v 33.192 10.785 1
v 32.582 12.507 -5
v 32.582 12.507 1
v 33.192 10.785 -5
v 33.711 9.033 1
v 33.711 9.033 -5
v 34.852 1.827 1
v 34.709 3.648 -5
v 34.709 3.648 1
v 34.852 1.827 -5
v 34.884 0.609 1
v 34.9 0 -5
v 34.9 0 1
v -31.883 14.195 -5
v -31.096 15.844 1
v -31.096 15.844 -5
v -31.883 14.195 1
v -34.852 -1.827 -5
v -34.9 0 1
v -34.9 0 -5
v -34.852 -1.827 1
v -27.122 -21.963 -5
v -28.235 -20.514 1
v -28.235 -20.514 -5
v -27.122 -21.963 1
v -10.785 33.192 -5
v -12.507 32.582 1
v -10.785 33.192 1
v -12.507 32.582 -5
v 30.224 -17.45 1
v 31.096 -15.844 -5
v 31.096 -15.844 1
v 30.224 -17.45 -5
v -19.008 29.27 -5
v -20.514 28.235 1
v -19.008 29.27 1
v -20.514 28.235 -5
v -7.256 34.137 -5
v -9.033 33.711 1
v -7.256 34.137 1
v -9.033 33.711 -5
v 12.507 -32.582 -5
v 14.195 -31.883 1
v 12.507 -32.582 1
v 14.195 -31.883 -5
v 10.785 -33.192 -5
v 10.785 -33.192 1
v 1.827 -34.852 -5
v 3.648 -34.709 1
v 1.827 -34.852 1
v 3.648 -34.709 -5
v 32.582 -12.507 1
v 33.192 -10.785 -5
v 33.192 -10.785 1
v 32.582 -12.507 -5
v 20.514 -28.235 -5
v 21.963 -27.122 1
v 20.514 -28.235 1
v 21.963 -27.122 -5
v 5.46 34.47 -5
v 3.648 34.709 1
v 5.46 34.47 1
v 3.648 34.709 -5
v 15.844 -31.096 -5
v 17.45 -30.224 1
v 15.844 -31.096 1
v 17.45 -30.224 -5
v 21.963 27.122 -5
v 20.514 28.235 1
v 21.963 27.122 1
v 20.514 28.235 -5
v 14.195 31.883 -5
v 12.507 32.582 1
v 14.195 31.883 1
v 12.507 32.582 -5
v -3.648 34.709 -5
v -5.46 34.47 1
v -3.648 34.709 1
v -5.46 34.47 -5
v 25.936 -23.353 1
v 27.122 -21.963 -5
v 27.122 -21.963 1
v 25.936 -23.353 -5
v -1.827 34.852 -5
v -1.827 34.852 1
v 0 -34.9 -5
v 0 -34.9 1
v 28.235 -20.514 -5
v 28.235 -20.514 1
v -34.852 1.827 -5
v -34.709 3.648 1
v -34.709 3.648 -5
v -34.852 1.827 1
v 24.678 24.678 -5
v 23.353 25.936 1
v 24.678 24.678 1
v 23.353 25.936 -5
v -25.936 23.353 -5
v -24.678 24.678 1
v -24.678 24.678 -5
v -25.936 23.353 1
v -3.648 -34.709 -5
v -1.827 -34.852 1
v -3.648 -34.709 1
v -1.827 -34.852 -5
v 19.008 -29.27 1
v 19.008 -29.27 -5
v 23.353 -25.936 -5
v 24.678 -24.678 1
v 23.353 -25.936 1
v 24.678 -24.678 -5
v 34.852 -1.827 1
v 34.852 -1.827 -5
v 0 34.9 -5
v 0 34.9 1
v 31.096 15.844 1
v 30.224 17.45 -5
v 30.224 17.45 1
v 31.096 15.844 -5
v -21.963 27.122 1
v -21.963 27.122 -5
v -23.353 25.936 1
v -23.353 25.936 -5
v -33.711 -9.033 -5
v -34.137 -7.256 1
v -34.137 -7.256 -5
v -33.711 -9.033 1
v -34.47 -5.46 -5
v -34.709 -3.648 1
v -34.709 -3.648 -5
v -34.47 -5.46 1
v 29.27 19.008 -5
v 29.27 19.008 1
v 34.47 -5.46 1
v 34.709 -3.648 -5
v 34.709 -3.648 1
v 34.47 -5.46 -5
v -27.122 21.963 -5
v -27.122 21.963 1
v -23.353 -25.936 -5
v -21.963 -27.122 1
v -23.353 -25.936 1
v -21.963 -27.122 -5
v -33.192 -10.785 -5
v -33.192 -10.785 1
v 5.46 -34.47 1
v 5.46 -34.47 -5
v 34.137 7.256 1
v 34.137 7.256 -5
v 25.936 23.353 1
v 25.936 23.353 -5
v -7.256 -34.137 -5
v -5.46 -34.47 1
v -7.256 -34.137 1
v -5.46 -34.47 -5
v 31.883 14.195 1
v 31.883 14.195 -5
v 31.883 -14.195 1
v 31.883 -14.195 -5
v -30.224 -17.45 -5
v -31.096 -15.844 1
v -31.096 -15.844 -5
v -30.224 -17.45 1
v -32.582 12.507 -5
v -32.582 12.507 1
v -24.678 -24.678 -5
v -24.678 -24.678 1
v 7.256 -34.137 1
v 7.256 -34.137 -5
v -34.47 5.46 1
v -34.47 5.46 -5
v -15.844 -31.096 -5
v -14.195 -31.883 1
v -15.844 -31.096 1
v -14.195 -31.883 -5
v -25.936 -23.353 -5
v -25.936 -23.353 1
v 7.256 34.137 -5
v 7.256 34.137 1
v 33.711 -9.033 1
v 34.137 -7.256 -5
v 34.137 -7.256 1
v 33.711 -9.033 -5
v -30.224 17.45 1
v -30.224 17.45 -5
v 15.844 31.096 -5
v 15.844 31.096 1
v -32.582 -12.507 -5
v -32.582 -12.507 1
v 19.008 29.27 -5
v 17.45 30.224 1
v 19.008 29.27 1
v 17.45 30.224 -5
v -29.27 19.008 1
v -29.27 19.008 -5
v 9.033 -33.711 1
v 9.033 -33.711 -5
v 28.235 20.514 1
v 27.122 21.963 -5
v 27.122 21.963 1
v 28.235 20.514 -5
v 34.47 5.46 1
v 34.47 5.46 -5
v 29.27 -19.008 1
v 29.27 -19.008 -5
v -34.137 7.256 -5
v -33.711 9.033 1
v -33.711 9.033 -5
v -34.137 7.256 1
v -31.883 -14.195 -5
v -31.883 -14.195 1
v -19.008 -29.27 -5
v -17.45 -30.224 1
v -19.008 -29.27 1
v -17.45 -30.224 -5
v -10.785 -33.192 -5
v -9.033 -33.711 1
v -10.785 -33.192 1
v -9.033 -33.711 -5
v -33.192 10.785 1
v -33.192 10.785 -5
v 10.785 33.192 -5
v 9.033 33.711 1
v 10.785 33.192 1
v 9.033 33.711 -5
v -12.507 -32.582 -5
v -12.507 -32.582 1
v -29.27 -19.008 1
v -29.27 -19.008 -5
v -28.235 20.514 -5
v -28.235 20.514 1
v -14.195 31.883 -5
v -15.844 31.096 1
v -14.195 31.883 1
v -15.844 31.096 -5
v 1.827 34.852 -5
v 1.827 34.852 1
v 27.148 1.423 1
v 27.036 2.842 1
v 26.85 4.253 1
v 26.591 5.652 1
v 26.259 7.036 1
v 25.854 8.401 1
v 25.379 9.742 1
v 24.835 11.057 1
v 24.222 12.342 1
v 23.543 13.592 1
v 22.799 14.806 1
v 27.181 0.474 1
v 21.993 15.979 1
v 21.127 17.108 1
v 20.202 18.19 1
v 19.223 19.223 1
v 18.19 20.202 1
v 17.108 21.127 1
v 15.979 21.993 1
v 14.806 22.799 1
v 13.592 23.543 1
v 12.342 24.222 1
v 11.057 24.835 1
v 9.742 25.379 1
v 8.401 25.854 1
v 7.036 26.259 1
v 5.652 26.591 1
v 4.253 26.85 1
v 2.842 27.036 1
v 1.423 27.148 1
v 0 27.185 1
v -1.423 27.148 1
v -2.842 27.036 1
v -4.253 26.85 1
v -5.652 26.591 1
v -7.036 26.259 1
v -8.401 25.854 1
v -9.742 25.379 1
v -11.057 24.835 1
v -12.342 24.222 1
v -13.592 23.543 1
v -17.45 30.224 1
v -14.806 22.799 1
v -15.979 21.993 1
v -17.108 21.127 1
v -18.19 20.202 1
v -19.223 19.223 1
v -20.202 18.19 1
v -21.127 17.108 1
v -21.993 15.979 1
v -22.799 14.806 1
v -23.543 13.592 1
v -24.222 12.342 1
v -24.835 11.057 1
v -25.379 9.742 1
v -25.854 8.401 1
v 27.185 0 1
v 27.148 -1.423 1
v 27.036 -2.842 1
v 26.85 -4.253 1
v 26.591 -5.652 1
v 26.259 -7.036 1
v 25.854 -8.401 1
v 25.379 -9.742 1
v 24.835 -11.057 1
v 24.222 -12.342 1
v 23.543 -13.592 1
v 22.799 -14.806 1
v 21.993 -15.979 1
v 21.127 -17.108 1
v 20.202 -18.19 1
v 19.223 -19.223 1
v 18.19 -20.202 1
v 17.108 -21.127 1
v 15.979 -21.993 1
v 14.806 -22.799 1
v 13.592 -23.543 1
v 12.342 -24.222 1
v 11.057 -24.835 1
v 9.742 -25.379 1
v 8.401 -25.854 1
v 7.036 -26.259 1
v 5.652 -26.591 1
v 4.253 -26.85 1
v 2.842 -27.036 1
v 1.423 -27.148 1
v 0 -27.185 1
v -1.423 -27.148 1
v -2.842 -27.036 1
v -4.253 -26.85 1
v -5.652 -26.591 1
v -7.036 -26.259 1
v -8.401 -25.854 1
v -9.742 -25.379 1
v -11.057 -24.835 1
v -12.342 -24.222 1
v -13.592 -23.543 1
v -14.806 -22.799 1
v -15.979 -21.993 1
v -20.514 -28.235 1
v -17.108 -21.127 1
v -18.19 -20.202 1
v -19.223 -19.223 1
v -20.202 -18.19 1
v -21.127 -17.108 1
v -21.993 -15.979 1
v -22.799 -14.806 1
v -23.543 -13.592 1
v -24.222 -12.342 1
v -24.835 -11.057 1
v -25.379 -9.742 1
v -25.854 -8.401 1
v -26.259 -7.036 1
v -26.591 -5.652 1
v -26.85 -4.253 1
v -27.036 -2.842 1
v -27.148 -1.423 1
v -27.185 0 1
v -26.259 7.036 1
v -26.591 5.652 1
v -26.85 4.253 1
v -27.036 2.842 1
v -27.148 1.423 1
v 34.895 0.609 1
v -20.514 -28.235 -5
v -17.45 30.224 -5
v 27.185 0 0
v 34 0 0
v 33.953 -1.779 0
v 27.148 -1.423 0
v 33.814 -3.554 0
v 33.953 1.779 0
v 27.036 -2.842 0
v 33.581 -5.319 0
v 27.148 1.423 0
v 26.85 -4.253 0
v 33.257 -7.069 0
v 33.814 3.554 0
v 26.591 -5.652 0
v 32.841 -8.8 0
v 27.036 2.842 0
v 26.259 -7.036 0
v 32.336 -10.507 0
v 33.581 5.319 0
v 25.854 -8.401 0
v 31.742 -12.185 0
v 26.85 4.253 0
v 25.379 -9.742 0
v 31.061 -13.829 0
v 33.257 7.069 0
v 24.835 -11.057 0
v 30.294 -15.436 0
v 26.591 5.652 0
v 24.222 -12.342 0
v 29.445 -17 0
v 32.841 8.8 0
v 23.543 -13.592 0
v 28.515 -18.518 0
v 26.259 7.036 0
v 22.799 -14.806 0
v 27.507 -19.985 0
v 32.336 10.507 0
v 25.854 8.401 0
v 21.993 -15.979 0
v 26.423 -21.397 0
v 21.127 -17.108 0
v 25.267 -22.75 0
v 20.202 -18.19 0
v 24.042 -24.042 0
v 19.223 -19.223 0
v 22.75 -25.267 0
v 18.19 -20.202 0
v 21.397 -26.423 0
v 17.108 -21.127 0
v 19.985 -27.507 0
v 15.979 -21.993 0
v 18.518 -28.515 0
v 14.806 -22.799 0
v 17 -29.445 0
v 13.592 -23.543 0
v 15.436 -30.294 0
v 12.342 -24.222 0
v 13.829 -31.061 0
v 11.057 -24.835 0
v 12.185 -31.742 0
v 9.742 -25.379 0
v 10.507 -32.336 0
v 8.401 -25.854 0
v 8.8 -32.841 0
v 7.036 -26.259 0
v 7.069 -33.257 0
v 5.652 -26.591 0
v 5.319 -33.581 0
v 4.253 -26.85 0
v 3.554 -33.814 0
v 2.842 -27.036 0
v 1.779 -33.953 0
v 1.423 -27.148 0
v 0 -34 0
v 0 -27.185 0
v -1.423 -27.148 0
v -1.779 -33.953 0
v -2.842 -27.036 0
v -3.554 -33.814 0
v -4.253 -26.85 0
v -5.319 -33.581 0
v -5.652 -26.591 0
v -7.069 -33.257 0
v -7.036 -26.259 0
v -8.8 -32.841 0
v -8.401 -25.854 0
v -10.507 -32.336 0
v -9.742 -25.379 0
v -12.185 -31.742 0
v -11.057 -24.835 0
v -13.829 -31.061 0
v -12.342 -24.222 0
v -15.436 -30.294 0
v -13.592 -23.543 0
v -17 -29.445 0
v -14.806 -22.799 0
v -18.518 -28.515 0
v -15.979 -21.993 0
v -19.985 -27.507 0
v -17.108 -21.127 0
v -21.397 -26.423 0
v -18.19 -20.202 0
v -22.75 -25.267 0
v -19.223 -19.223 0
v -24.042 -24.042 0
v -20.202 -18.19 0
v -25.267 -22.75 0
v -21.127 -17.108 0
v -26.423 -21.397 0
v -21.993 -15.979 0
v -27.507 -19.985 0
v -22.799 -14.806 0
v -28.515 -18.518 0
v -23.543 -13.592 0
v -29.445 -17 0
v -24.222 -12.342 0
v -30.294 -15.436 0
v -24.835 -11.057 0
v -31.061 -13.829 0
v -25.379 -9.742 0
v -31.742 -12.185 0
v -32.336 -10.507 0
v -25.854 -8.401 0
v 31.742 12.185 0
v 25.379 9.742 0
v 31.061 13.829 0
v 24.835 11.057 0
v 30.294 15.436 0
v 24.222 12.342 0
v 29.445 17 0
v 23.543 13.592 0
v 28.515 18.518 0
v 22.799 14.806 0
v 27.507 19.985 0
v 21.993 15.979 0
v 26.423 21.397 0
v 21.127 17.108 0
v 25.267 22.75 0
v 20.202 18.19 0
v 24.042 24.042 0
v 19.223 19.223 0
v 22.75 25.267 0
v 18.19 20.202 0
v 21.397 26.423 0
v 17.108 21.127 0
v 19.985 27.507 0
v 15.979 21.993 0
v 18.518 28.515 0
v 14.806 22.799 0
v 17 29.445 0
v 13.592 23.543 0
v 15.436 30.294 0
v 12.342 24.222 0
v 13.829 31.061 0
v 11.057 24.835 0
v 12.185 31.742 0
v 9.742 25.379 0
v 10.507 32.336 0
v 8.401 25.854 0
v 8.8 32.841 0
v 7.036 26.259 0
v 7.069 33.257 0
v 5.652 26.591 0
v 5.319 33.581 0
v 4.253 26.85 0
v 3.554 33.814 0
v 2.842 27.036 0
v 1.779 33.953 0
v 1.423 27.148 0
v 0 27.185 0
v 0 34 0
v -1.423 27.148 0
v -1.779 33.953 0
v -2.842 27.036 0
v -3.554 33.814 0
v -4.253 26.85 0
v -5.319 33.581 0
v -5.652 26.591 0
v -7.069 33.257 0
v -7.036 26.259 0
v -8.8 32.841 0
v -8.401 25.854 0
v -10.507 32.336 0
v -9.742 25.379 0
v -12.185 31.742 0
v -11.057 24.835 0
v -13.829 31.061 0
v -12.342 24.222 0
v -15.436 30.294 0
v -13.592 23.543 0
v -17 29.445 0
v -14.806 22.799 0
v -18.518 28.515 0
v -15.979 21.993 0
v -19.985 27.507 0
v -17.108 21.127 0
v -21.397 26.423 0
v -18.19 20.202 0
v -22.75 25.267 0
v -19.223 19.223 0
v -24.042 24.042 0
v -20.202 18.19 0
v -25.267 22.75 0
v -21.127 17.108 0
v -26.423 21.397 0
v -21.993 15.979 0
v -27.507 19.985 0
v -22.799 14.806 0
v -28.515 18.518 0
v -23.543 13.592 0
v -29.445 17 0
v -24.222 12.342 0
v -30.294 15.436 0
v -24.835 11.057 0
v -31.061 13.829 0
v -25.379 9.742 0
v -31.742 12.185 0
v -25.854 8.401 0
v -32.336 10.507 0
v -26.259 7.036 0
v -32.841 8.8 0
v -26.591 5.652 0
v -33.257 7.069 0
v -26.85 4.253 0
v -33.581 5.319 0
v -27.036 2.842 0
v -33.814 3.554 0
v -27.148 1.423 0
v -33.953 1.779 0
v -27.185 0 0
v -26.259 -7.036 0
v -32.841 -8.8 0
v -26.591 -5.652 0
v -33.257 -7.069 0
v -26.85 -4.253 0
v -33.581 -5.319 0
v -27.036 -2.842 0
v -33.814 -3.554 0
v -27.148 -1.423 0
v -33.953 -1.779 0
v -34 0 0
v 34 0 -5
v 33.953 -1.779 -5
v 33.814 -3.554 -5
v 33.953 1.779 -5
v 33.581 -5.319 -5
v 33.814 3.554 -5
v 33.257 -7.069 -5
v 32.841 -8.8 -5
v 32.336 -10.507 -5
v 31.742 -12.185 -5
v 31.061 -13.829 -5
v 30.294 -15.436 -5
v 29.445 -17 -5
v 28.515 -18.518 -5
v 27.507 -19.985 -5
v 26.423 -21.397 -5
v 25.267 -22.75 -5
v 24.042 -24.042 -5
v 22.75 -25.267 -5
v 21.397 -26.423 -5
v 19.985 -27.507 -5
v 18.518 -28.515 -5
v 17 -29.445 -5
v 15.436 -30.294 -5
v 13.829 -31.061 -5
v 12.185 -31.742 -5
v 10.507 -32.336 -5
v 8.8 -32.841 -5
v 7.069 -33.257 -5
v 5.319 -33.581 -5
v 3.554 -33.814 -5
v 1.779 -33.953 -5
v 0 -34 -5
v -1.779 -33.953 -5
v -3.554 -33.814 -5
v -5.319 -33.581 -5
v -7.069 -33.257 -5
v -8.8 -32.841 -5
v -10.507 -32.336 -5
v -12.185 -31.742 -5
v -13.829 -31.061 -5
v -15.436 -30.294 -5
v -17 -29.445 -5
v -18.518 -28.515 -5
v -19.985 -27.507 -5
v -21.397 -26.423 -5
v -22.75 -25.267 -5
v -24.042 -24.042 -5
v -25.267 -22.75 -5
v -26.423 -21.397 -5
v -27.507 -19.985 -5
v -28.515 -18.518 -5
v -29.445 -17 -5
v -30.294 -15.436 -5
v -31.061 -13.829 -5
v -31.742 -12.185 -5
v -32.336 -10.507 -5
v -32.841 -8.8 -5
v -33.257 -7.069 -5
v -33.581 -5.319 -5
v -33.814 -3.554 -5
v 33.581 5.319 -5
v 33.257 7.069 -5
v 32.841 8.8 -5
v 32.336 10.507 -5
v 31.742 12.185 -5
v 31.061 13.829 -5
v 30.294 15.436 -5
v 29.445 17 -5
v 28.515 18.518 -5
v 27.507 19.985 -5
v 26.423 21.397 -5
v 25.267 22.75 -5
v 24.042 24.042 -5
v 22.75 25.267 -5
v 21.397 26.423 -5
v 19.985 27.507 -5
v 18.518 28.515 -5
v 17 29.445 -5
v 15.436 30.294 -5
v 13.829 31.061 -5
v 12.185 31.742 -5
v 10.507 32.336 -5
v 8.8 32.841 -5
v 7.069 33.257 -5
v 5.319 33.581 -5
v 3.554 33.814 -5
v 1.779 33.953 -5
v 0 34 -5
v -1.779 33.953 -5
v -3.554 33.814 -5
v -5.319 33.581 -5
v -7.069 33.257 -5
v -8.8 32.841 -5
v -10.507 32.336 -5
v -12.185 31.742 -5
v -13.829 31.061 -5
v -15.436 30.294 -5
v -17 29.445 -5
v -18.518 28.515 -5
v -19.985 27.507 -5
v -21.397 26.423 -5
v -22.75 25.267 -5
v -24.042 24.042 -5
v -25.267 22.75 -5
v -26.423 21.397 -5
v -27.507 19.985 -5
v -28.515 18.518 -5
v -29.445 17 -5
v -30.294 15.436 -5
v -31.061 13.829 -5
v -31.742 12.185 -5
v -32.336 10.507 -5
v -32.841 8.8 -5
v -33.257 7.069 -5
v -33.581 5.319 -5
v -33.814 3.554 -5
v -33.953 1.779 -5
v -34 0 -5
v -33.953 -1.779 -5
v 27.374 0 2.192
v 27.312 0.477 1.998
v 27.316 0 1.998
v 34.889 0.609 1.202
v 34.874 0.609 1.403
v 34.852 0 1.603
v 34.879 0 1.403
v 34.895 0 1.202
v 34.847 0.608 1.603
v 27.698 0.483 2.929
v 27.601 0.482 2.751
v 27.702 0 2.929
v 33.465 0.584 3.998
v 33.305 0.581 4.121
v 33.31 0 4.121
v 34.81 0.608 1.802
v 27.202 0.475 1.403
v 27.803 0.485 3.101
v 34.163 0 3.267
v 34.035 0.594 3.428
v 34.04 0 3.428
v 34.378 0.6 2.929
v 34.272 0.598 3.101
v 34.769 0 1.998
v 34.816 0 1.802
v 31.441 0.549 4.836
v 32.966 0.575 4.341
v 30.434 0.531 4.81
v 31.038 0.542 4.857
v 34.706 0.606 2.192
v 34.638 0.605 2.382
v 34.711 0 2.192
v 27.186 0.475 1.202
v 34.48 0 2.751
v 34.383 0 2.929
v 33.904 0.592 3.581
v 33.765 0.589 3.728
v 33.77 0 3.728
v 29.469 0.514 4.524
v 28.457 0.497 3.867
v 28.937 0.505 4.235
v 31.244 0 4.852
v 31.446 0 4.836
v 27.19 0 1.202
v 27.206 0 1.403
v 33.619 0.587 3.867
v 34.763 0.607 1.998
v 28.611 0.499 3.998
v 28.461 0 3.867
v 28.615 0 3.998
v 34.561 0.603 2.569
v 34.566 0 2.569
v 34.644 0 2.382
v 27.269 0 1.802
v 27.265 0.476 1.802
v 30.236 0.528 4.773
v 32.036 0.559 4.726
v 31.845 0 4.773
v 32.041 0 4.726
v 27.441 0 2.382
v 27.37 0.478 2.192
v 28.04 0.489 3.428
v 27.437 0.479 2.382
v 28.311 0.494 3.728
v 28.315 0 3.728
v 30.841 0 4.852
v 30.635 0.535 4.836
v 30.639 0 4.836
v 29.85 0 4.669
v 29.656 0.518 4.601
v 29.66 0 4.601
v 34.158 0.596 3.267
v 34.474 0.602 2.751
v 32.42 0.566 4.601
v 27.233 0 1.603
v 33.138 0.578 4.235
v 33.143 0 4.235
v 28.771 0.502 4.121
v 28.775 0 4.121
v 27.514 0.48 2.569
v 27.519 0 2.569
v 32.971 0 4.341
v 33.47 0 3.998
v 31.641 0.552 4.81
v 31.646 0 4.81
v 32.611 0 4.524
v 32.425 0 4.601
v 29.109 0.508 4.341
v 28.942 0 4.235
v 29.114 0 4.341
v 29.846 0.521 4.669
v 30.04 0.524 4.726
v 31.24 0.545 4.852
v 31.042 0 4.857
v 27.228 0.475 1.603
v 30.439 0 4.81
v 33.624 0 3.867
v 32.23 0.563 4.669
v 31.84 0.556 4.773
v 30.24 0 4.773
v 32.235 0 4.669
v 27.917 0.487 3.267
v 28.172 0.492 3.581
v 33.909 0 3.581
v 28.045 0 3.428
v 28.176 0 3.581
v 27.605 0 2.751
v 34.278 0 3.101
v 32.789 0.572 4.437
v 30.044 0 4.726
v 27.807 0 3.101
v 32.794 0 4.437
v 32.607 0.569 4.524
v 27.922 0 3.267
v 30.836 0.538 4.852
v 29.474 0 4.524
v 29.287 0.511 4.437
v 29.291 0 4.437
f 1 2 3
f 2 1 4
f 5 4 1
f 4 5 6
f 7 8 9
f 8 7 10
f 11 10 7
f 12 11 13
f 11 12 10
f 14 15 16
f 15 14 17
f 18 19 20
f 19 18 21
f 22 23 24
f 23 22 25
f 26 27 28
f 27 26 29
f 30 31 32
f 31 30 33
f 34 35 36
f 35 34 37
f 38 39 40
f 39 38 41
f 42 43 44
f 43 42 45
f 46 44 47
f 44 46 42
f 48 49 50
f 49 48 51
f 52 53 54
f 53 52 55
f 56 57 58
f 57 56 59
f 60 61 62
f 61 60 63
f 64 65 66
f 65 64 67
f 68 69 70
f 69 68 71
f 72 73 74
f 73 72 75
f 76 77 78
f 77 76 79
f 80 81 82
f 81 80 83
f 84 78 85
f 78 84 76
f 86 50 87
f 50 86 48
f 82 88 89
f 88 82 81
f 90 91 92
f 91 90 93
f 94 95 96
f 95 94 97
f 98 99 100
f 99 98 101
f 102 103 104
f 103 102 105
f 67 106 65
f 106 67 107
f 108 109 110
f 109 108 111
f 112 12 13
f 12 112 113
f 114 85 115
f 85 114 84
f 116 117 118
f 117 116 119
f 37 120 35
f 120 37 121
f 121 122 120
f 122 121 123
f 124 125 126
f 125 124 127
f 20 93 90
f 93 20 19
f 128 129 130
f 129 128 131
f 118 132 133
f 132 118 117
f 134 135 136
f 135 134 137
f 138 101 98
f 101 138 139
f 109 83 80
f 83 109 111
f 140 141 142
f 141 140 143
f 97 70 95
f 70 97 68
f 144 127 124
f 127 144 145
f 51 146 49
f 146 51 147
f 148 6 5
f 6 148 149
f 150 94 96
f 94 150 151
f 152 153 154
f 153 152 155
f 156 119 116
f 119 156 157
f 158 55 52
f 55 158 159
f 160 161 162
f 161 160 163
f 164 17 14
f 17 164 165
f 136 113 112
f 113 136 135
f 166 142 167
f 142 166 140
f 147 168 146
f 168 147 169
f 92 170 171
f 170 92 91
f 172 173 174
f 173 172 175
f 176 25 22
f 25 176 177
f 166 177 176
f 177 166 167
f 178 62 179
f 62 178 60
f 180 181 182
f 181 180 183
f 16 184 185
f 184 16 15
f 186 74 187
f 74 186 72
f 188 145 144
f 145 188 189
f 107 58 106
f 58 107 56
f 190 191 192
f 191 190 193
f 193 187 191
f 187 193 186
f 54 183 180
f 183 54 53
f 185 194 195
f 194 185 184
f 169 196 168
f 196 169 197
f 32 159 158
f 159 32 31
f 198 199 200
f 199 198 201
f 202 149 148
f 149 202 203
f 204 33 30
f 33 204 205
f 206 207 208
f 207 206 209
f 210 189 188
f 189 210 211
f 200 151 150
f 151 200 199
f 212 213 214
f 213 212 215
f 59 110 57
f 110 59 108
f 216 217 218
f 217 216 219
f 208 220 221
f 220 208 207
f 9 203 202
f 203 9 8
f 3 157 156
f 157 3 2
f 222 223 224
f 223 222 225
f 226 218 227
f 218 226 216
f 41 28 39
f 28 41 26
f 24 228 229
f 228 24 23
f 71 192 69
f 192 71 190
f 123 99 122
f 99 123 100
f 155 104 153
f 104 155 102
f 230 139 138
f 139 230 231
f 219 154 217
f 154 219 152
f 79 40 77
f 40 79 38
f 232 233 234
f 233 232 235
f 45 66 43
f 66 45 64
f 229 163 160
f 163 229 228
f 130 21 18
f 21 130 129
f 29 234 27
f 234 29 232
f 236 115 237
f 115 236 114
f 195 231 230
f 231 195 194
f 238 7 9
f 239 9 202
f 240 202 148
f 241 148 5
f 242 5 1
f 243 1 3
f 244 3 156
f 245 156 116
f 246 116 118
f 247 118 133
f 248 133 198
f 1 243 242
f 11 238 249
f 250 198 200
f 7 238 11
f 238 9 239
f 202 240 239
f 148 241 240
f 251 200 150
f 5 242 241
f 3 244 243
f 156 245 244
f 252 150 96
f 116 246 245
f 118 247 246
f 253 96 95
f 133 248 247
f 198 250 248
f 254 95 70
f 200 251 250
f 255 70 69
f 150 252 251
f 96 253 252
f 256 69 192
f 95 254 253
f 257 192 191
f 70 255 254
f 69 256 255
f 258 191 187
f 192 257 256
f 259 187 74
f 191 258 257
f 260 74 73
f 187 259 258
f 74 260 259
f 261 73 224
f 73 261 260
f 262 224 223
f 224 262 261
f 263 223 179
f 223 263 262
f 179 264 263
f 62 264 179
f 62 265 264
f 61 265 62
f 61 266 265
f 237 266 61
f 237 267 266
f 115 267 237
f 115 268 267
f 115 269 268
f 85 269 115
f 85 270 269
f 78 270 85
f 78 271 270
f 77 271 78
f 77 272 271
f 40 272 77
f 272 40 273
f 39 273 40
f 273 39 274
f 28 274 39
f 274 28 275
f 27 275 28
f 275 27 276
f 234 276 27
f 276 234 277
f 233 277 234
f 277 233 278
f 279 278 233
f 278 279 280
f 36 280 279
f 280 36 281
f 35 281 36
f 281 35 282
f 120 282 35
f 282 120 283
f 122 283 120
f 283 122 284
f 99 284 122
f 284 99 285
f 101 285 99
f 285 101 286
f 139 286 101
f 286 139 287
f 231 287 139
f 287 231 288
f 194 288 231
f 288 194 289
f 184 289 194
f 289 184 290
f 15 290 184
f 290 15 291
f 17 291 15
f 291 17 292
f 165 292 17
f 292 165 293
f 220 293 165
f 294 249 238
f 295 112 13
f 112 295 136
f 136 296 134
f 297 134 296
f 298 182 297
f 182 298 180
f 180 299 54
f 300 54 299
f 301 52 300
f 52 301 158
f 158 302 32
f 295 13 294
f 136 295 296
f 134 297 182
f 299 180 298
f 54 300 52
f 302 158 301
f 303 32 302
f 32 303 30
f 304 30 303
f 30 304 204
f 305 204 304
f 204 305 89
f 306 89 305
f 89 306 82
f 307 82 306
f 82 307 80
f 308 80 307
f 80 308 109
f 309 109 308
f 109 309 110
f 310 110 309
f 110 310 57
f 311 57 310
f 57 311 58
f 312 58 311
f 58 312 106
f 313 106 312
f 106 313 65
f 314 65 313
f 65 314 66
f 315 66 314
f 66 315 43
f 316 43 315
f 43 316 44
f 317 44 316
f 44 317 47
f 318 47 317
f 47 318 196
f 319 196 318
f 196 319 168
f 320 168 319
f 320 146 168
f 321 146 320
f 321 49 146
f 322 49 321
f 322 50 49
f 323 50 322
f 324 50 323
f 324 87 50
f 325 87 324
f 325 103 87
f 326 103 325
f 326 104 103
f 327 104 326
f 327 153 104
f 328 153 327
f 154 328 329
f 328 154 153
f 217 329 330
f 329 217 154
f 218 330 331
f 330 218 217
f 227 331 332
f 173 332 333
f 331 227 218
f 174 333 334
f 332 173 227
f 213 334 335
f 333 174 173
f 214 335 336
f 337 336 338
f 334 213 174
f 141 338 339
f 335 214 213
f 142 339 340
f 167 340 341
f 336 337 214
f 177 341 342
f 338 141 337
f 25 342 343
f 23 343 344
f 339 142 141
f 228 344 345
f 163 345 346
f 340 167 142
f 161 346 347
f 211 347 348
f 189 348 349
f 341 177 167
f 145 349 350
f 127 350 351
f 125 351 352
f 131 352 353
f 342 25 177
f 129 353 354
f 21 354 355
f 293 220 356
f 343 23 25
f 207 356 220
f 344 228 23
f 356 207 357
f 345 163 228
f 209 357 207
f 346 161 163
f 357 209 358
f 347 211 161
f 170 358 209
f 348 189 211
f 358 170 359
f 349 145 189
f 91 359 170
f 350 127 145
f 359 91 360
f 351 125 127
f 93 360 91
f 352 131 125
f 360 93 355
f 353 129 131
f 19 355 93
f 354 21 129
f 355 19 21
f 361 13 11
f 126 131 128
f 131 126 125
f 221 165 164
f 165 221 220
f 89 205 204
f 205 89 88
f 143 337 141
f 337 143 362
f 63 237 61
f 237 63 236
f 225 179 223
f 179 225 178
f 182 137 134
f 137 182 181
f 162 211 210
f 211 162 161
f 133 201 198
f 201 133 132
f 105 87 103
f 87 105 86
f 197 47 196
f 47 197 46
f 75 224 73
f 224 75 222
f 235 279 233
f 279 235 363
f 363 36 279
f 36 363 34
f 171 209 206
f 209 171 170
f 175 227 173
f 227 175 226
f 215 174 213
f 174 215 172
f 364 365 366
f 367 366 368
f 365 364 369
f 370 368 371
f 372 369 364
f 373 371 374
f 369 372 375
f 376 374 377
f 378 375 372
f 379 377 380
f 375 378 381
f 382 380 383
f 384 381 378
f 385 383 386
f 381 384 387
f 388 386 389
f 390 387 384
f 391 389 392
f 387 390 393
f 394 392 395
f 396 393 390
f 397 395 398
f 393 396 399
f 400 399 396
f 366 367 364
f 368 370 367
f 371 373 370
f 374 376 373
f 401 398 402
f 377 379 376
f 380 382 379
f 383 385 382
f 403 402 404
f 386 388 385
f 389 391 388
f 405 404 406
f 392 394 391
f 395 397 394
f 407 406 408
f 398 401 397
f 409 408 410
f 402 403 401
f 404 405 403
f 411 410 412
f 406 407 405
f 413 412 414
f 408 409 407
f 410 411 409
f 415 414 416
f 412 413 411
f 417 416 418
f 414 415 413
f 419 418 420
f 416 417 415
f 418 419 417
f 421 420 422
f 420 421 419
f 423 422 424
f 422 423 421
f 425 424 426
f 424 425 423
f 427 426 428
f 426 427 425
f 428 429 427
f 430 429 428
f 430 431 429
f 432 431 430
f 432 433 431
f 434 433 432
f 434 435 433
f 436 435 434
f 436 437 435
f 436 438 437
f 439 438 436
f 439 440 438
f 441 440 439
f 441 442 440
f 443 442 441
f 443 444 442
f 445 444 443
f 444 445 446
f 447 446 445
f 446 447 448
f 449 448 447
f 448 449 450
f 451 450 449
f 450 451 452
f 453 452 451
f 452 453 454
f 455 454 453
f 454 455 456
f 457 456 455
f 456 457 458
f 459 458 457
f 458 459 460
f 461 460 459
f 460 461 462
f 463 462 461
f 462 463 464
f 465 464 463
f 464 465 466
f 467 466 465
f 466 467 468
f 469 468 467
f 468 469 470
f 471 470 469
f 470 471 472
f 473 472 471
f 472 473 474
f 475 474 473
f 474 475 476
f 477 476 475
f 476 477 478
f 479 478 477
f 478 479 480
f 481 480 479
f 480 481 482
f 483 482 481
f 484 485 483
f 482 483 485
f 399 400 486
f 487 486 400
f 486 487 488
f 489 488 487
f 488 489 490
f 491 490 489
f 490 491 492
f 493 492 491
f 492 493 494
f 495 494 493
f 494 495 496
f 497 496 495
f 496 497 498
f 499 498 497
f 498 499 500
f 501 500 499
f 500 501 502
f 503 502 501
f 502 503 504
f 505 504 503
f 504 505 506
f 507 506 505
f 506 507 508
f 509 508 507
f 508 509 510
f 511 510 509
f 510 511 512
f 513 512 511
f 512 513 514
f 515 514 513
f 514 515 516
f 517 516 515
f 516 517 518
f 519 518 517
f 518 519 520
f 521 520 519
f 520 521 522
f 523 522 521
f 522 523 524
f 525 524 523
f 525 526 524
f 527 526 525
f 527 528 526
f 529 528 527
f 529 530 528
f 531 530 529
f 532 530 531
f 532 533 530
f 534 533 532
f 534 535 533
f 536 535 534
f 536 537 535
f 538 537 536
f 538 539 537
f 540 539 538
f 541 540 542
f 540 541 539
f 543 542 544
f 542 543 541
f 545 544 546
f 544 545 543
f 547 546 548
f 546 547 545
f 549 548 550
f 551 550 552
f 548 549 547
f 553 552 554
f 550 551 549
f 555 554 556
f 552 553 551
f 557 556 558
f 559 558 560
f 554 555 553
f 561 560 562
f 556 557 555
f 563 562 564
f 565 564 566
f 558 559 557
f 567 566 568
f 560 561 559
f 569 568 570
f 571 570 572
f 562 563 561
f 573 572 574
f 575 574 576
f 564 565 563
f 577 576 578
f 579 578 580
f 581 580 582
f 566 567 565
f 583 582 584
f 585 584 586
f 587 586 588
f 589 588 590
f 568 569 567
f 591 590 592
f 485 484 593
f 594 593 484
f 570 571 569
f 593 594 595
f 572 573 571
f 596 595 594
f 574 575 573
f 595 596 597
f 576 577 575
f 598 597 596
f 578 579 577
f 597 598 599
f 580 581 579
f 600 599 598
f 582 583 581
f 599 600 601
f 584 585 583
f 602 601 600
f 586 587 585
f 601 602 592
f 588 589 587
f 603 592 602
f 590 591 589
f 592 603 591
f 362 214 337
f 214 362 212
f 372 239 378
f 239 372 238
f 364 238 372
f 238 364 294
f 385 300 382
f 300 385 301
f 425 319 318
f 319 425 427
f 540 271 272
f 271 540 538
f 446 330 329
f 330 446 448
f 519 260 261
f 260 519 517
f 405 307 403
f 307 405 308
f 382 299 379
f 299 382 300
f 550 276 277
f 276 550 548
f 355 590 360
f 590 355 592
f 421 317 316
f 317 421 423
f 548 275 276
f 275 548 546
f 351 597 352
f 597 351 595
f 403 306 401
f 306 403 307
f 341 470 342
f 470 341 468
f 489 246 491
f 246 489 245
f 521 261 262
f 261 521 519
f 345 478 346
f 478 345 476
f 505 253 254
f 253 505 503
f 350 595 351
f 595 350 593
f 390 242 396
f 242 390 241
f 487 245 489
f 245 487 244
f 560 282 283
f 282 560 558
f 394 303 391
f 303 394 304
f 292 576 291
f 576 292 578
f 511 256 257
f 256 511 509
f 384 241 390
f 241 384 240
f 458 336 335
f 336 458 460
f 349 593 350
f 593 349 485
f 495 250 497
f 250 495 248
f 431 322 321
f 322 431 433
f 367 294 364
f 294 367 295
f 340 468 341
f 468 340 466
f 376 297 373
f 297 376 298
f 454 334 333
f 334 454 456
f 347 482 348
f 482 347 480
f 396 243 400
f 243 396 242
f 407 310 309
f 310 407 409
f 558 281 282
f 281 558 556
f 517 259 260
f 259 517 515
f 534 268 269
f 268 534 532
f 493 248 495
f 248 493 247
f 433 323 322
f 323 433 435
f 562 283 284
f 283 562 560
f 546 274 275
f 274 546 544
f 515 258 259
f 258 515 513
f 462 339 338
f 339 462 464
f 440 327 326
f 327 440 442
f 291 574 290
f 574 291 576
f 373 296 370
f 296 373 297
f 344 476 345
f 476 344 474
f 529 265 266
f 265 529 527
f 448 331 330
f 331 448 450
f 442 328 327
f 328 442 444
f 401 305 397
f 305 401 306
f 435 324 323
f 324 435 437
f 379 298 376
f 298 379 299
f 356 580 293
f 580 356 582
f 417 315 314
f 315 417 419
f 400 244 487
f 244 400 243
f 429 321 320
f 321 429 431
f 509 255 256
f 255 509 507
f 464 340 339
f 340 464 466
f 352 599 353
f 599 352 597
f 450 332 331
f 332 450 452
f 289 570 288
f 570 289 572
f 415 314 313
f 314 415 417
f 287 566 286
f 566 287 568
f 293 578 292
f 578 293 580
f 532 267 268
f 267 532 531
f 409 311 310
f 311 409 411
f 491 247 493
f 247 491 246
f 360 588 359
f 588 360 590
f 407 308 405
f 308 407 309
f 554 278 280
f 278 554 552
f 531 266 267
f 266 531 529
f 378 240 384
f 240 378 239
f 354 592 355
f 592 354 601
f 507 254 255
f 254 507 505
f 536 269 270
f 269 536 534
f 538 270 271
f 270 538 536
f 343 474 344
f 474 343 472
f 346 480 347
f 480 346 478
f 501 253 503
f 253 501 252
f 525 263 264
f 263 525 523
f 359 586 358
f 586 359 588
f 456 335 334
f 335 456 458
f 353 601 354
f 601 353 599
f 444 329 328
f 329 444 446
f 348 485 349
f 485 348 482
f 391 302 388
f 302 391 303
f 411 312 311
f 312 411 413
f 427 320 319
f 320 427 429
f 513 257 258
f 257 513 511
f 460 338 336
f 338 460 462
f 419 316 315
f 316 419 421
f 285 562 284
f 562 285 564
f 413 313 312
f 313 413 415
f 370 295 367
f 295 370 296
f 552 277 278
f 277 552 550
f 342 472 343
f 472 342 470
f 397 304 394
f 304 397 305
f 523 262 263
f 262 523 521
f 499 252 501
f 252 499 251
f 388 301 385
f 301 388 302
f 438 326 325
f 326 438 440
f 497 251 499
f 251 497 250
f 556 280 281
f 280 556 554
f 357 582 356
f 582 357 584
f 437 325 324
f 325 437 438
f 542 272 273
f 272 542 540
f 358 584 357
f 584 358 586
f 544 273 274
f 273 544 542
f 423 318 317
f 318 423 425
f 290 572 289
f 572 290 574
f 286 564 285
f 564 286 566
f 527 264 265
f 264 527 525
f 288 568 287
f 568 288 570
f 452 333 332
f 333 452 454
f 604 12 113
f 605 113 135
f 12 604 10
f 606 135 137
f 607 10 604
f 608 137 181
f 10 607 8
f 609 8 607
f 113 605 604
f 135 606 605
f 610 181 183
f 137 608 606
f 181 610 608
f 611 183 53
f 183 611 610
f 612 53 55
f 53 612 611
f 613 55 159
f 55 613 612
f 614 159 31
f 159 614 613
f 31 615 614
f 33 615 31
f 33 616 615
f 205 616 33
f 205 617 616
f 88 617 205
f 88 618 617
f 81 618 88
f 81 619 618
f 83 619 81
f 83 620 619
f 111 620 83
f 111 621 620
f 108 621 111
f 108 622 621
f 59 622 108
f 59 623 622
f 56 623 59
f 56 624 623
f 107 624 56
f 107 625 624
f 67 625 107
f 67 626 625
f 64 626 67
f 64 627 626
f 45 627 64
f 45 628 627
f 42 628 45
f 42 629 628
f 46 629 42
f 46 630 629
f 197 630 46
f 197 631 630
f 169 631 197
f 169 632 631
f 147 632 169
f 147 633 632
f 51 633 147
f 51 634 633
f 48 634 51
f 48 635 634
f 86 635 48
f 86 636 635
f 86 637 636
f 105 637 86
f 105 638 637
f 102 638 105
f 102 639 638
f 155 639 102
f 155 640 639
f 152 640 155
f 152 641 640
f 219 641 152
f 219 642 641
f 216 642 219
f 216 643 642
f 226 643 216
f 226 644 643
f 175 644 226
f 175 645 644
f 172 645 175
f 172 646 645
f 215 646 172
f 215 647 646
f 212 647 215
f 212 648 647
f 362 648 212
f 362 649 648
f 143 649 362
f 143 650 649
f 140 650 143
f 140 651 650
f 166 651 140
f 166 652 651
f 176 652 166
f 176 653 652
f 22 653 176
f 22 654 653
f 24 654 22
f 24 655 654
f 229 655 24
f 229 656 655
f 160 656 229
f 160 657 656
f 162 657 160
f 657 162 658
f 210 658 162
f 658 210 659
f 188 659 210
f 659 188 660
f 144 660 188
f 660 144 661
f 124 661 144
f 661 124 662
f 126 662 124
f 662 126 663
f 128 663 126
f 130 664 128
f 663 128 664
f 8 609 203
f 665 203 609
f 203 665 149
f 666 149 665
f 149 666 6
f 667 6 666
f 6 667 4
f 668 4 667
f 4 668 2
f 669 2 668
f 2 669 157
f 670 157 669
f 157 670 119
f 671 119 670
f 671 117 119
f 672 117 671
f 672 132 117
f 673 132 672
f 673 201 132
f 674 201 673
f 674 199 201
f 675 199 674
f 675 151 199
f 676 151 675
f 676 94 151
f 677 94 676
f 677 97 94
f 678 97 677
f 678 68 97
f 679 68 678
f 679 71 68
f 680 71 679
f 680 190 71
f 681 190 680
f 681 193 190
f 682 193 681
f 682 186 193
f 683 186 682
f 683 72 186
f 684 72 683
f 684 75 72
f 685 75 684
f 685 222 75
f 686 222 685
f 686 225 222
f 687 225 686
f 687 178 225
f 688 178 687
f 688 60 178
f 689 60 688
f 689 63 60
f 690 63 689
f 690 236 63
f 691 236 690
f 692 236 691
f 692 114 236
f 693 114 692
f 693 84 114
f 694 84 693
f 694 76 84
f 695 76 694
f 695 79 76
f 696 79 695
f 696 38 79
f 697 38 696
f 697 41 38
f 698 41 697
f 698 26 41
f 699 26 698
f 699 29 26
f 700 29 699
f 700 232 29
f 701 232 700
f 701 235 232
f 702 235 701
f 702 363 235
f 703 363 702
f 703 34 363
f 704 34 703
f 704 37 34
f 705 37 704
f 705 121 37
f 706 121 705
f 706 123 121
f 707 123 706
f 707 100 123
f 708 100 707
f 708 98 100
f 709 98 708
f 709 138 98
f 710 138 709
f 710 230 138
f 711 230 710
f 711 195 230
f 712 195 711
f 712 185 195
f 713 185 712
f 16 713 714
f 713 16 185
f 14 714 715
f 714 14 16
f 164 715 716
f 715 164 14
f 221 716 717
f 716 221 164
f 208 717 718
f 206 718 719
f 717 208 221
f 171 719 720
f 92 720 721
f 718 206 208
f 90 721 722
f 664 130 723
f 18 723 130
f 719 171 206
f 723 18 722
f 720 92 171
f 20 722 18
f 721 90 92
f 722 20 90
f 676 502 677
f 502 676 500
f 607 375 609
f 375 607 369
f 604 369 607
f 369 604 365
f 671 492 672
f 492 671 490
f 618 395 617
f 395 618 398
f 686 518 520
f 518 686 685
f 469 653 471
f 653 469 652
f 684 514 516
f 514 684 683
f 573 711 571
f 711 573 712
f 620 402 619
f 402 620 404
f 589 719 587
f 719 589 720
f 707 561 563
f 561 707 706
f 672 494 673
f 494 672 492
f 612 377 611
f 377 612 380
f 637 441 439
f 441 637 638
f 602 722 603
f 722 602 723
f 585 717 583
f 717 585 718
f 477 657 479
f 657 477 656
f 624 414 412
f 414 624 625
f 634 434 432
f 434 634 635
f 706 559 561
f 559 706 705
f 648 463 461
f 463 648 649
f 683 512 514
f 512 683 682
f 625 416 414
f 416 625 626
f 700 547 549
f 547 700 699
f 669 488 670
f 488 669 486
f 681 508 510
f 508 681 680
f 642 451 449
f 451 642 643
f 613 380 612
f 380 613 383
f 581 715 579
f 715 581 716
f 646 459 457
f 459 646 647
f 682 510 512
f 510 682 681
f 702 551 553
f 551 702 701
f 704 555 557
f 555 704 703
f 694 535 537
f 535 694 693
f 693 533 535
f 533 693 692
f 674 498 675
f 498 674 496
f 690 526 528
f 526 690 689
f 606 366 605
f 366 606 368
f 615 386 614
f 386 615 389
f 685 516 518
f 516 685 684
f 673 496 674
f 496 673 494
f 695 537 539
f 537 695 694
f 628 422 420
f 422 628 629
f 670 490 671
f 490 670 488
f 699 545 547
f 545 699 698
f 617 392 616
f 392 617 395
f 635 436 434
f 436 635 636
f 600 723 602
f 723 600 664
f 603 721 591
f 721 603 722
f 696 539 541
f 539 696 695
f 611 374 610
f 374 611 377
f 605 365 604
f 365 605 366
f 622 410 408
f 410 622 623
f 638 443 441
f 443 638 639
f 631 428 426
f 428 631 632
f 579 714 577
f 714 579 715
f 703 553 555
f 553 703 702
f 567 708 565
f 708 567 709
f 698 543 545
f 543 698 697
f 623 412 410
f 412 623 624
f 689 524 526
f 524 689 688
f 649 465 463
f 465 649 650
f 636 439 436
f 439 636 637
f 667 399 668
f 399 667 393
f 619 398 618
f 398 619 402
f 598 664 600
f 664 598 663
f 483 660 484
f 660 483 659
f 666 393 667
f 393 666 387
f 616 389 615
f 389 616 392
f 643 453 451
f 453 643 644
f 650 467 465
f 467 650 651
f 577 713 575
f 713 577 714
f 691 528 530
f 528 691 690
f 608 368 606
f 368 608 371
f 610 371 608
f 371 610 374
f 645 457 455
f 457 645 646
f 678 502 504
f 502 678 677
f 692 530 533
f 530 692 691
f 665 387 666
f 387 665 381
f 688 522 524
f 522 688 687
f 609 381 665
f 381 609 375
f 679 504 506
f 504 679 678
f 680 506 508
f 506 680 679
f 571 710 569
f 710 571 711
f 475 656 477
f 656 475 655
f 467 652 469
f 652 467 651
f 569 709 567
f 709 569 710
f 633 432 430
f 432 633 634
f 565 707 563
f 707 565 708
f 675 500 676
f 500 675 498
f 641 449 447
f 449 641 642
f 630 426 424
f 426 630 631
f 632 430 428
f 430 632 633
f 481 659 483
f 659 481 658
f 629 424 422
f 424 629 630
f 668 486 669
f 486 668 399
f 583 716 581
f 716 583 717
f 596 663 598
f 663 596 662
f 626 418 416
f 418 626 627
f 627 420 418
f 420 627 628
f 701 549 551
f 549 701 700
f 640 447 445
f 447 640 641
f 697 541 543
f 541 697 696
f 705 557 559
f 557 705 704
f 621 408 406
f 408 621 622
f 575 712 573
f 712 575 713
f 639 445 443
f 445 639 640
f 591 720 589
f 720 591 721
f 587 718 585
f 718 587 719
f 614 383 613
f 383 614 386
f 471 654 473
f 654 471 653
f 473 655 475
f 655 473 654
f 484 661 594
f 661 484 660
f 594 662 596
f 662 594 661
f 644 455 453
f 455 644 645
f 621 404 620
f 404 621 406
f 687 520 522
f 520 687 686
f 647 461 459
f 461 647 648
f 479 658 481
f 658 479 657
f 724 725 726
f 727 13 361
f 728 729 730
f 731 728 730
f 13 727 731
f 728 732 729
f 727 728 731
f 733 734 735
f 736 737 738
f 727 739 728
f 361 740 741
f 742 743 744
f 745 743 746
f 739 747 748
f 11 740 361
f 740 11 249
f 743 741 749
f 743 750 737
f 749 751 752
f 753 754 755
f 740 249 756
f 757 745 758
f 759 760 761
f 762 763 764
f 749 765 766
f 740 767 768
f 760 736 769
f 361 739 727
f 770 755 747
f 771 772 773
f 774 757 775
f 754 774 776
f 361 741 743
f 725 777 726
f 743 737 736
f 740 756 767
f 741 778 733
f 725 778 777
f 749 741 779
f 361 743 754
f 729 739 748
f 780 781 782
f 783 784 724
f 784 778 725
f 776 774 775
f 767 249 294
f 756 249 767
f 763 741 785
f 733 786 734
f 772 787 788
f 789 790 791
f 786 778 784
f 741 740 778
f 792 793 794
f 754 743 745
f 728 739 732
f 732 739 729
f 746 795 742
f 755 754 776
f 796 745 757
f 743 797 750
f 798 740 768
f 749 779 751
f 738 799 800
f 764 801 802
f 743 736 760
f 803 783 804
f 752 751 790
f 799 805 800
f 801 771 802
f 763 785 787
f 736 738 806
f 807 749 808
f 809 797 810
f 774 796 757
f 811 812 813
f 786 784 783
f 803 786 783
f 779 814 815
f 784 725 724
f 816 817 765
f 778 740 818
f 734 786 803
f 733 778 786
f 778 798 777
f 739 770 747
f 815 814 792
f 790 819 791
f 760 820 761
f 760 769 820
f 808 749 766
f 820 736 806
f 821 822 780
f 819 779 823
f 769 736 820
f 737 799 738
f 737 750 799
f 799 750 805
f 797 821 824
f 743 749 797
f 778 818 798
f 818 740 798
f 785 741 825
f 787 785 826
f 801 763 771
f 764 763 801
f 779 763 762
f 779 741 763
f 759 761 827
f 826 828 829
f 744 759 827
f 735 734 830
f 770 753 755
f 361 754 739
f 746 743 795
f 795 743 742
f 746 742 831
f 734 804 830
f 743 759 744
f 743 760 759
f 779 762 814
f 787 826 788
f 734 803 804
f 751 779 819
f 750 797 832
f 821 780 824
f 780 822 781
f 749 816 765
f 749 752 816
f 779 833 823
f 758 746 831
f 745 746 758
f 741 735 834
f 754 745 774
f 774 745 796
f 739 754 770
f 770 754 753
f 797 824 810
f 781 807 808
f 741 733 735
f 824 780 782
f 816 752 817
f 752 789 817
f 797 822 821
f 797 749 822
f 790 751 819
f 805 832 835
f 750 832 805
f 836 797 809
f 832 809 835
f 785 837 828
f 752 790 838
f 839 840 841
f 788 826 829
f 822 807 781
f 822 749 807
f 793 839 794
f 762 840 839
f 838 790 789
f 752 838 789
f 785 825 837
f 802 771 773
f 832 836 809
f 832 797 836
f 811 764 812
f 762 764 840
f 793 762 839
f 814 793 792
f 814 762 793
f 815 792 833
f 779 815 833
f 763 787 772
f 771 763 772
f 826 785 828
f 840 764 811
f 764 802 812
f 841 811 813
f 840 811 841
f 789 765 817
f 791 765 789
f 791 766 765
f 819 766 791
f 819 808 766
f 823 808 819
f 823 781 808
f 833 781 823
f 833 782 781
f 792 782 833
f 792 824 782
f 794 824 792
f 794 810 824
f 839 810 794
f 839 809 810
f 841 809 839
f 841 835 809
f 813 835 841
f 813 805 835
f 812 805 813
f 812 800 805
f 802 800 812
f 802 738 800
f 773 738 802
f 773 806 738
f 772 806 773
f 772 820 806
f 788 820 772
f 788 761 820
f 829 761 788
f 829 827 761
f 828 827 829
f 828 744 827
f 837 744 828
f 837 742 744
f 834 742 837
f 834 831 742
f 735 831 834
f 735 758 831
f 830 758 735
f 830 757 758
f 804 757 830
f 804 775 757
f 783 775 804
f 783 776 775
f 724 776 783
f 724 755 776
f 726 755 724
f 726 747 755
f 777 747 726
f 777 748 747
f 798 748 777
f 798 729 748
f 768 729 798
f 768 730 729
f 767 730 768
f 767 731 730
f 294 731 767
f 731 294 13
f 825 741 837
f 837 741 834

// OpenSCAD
// 68.15 - 54.37 mm

$fn = 120;

// 24-led ring
//outerRadius = 85.85 / 2;
//innerRadius = 71.86 / 2;

// 16-led ring
outerRadius = 69.8 / 2;
innerRadius = 54.37 / 2;

centerRadius = (outerRadius + innerRadius) / 2;
ringThickness = (outerRadius - innerRadius);

difference() {
    cylinder(r=outerRadius,h=1);
    translate([0,0,-0.5])
    cylinder(r=innerRadius,h=2);
}
translate([0,0,-5])
    difference() {
        cylinder(r=outerRadius,h=5);
        cylinder(r=outerRadius-0.9,h=5.01);
    }

translate([0,0,1])
rotate_extrude(angle=1, convexity=2) {
    translate([centerRadius,0,0])
    difference() {
        circle(r=ringThickness / 2);
        translate([-ringThickness / 2, -ringThickness, 0])
            square(size=ringThickness);
    }
}
